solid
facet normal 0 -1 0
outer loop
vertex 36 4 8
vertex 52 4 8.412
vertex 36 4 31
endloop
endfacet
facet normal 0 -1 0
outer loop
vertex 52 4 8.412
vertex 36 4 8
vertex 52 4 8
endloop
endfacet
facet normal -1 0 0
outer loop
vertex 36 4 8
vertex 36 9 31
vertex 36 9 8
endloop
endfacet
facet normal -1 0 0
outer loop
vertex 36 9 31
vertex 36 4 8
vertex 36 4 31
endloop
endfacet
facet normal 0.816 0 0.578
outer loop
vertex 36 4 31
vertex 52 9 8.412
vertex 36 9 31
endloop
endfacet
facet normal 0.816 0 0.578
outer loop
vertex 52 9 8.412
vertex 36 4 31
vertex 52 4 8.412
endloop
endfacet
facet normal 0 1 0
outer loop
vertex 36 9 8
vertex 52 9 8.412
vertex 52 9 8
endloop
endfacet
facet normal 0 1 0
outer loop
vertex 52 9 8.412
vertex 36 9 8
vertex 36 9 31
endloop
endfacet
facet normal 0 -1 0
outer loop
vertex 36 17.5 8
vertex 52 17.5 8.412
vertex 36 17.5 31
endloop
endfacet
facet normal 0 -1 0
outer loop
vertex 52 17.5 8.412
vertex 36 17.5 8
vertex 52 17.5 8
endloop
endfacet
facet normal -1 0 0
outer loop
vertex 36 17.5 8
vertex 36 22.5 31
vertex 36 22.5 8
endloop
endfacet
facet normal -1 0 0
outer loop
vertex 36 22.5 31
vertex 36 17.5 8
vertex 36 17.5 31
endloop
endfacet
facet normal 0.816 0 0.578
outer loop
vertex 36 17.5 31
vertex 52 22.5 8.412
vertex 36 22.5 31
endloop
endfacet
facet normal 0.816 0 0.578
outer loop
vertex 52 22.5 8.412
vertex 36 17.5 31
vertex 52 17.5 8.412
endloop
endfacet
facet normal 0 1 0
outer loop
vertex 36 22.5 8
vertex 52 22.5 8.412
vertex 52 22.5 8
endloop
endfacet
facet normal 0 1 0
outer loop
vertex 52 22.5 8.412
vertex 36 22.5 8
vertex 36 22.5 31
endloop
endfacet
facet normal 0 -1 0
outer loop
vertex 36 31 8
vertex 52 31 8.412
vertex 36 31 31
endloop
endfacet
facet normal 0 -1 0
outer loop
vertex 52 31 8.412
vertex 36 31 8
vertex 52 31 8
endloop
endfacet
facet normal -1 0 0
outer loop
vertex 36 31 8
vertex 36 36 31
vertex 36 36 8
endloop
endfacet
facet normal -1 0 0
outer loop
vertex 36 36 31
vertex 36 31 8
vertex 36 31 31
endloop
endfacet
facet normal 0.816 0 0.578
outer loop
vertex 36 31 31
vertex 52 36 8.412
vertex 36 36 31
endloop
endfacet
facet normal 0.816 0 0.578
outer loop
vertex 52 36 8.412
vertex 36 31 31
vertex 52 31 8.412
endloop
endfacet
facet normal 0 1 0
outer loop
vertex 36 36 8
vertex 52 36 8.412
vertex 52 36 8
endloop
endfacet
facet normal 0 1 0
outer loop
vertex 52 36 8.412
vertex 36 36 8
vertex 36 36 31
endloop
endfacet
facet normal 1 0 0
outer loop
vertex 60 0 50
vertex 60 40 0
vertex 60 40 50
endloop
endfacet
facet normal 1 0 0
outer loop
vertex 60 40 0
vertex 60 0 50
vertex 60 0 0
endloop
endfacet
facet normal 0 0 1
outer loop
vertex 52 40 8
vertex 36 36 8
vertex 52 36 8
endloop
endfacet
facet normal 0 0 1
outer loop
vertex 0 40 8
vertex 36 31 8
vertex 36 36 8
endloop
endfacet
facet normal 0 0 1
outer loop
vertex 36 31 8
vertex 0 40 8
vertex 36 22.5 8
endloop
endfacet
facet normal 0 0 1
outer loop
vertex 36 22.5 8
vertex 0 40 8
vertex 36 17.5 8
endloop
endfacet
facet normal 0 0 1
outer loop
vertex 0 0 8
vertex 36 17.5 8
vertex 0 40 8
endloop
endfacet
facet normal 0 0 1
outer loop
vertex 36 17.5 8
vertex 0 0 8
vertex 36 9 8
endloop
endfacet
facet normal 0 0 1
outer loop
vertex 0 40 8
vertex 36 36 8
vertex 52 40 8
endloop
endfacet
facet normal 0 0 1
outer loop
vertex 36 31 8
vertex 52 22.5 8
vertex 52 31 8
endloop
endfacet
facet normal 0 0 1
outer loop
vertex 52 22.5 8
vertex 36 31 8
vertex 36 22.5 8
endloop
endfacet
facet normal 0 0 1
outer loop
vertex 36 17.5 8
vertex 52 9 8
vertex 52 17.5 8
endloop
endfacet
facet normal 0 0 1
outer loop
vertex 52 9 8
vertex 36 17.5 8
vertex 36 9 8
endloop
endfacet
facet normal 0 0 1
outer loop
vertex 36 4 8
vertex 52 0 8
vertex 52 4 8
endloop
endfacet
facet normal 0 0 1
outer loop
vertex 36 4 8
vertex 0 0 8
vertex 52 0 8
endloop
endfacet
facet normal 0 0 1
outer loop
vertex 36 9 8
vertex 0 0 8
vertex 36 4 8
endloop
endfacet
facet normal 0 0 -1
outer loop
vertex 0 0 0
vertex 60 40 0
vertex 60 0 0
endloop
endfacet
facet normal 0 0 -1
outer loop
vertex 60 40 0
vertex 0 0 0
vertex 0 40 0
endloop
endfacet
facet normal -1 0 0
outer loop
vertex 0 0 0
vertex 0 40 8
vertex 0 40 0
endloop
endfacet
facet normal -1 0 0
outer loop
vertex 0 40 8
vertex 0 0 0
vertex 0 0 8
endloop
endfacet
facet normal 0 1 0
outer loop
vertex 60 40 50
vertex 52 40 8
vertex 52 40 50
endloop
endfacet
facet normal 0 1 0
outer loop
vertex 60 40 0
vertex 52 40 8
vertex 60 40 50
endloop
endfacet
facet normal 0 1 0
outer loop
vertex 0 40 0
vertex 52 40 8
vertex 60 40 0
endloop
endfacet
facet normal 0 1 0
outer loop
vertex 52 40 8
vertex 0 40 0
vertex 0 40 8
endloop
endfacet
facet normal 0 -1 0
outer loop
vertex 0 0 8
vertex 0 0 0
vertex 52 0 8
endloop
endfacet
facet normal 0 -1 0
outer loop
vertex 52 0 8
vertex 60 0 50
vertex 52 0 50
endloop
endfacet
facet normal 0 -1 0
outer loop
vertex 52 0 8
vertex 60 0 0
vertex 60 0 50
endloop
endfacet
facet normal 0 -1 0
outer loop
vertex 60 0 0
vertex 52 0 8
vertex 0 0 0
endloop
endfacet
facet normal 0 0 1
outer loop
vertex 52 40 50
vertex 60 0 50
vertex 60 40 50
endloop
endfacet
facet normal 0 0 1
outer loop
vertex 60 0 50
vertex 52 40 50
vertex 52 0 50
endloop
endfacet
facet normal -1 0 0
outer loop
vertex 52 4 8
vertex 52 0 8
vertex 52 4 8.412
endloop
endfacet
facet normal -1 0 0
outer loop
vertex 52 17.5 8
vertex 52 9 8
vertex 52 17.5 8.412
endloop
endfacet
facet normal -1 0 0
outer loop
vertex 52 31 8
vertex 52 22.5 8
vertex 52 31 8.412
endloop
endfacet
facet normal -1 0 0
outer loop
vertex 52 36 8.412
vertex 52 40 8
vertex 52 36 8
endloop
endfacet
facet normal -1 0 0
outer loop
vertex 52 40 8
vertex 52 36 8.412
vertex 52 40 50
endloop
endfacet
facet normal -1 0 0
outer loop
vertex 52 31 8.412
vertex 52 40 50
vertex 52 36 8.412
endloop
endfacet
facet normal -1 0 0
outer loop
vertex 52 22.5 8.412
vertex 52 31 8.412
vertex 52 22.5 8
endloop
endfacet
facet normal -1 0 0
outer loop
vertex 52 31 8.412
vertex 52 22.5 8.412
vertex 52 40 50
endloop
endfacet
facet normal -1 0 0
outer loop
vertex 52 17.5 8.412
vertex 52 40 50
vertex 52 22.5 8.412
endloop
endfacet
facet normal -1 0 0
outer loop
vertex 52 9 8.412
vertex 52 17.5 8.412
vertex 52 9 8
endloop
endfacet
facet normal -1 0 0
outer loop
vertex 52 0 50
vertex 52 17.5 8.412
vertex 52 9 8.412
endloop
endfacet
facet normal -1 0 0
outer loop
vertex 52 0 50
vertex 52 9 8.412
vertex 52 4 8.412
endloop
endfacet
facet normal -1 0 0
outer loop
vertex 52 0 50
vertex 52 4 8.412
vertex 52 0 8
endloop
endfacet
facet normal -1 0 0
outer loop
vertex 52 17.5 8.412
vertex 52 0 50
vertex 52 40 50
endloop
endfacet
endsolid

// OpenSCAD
$fn = 32;

// ----------------------------------------------------------------------
// Rib bracket: 3-gusset L bracket
// ----------------------------------------------------------------------

// --- parameters (mm) ---
base_l = 60;              // foot length, X
base_w = 40;              // foot width, Y
base_t = 8;               // foot thickness
plate_t = 8;              // upright plate thickness
plate_h = 50;             // overall height
gus_l = 16;               // gusset leg along the foot
gus_h = 24;               // gusset height
gus_t = 5;                // gusset thickness
gus_edge = 4;             // gusset margin from the foot edge
n_gus = 3;                // gusset count
fit_tol = 0.05;           // tolerance for press fits, mm
free_tol = 0.2;           // tolerance for clearance fits, mm

gus_pitch = (base_w - 2 * gus_edge - gus_t) / (n_gus - 1);  // gusset pitch

union() {
  cube([base_l, base_w, base_t]);
  translate([base_l - plate_t, 0, base_t - 1])
    cube([plate_t, base_w, plate_h - base_t + 1]);
  for (i = [0 : n_gus - 1])
    translate([base_l - plate_t - gus_l, gus_edge + i * gus_pitch, base_t - 1])
      rotate([-90, 0, 0])
        linear_extrude(height = gus_t)
          polygon(points = [[0, 0], [gus_l + 1, 0], [0, -gus_h]]);
}
